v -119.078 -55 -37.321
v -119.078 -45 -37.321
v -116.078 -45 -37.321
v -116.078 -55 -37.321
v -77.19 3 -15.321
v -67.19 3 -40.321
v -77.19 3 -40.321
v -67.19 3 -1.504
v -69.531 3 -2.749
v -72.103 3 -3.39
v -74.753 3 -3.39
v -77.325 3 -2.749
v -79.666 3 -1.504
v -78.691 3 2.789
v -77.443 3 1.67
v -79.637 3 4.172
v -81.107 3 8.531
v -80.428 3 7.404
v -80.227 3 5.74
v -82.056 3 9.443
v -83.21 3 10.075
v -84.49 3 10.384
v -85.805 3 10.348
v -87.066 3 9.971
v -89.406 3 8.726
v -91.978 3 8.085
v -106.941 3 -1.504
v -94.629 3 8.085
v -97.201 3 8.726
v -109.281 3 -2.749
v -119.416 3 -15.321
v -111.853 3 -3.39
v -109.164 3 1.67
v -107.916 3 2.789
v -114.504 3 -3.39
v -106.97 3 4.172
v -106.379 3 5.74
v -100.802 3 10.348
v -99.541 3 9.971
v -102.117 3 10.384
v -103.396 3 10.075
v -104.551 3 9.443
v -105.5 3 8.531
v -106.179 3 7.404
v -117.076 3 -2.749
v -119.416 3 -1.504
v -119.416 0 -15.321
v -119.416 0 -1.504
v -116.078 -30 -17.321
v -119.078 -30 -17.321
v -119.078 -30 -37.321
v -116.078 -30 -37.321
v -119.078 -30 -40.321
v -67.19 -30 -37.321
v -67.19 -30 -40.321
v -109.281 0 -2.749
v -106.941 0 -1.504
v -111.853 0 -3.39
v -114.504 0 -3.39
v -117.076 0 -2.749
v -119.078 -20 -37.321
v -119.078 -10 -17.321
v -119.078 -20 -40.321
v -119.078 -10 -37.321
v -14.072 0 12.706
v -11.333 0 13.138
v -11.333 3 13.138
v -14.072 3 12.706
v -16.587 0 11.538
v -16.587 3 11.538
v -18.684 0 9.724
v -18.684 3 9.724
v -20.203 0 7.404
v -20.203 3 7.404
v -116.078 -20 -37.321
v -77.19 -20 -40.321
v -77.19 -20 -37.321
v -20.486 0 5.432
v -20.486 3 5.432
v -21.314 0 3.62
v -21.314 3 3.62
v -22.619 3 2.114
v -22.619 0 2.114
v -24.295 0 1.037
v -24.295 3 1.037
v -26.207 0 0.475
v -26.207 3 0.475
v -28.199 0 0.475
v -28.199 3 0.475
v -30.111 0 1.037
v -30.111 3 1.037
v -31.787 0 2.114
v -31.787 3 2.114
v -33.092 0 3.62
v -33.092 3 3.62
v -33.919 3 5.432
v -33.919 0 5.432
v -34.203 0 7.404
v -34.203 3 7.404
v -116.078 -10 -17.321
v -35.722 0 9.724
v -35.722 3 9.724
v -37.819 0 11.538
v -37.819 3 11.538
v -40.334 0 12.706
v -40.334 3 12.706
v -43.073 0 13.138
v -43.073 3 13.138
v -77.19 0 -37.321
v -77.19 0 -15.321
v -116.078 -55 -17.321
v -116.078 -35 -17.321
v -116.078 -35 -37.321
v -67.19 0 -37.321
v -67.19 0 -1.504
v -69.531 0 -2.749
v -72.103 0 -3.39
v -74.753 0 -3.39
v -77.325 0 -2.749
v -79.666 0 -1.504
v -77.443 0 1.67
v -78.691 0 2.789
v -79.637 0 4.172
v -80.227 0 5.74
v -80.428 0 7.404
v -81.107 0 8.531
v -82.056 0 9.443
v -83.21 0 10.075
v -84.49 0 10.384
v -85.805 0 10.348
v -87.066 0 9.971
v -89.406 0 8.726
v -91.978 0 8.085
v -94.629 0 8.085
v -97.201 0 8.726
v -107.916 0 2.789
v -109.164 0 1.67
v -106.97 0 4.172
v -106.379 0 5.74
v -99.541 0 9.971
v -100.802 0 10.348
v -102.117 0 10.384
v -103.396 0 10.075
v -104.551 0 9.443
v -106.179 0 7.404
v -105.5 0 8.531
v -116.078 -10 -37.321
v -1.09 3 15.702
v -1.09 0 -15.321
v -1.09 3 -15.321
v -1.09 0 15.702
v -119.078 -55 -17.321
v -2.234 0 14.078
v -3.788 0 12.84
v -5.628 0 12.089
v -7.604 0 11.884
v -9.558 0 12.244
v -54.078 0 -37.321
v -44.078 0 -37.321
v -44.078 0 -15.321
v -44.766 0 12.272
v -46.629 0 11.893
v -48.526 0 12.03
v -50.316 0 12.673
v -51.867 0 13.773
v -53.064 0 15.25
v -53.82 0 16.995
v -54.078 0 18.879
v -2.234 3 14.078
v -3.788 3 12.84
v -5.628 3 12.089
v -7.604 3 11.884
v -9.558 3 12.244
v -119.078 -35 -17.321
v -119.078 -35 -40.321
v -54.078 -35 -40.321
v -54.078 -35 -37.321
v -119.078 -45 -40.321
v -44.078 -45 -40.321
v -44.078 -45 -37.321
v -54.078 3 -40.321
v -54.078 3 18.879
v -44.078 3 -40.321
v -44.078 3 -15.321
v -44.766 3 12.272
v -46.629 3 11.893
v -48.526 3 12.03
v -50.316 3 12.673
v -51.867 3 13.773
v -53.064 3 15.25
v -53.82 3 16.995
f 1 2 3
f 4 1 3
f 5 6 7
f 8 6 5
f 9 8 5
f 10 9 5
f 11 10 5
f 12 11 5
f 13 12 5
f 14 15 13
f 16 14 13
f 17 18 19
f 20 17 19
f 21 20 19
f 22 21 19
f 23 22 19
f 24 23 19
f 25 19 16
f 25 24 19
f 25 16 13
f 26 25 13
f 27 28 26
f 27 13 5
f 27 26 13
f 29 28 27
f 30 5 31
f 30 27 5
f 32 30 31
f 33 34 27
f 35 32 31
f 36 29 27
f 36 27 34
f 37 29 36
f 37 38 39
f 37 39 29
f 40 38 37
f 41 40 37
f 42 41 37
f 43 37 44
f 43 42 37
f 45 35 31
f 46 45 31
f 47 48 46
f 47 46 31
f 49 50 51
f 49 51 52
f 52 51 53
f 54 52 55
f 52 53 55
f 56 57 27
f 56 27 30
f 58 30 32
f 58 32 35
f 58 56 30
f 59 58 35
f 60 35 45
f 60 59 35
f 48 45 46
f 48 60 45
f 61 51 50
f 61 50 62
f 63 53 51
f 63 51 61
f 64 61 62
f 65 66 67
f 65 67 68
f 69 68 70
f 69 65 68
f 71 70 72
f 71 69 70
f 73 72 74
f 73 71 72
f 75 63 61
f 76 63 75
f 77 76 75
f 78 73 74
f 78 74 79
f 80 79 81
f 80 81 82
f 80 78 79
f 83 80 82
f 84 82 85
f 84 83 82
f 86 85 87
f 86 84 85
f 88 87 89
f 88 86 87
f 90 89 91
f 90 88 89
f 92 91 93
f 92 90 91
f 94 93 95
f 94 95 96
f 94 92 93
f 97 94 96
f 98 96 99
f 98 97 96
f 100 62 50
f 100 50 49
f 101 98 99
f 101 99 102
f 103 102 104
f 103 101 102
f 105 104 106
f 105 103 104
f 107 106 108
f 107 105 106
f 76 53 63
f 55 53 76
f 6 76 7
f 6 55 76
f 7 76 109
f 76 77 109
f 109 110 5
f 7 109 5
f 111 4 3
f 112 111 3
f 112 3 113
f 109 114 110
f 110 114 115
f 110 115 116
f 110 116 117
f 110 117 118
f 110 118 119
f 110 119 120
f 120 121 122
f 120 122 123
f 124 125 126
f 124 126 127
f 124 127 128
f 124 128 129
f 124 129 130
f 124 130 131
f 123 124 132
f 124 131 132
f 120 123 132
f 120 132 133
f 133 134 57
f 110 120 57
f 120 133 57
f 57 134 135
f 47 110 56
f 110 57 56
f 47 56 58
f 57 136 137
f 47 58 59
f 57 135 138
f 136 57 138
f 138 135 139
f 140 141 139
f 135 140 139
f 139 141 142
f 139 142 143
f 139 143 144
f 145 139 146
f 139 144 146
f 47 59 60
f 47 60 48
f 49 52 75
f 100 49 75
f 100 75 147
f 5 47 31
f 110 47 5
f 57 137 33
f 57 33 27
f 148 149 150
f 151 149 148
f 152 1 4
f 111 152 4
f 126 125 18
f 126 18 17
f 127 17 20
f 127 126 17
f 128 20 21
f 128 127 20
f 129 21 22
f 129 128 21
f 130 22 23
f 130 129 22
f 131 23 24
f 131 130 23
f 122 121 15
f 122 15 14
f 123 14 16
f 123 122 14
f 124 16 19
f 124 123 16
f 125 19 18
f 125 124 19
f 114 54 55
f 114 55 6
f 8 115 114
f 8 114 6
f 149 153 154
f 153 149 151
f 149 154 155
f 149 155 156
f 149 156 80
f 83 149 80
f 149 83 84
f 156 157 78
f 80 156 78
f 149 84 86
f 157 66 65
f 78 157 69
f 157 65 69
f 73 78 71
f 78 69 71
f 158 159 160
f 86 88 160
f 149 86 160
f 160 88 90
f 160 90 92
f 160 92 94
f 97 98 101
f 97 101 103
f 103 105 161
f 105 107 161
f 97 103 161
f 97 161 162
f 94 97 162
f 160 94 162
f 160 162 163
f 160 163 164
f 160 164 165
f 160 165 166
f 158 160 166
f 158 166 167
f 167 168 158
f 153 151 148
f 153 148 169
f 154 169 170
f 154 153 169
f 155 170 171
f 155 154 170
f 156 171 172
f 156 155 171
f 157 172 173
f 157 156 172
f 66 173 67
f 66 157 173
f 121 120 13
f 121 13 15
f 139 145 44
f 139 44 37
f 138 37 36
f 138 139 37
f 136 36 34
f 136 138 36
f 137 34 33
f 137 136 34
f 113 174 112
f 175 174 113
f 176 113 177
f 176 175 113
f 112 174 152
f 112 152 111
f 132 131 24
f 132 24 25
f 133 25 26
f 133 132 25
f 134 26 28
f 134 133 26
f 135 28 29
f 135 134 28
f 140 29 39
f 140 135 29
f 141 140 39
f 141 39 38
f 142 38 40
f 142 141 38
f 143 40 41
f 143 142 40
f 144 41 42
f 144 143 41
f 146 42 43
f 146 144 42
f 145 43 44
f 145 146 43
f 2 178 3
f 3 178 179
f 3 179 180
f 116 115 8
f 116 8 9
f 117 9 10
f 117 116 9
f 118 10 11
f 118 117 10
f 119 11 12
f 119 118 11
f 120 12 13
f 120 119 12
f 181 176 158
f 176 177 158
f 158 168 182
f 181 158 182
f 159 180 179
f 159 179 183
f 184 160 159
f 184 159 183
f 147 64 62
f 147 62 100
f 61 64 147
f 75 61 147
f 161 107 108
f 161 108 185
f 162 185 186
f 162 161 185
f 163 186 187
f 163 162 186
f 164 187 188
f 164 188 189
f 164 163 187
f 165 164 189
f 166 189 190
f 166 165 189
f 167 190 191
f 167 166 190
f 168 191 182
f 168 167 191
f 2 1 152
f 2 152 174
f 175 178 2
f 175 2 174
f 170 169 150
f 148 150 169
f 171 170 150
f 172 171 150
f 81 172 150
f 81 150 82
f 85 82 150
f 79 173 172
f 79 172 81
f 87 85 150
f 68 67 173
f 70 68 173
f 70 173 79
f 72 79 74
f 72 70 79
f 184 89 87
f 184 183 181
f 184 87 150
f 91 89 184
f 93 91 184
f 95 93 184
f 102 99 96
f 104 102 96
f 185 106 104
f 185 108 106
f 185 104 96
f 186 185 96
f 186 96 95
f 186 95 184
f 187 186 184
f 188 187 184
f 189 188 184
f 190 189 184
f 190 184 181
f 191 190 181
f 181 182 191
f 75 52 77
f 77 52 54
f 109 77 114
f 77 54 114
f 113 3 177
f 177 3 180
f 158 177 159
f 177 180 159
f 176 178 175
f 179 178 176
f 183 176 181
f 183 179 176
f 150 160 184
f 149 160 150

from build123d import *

# Parameters (mm, degrees)
BOSS_EXTRUDE1_DEPTH   = 3
BOSS_EXTRUDE1_2_DEPTH = 3
SKETCH3_W             = 10
SKETCH3_H             = 3
BOSS_EXTRUDE2_DEPTH   = 25
SKETCH4_W             = 10
SKETCH4_H             = 3
BOSS_EXTRUDE3_DEPTH   = 33
SKETCH5_W             = 10
SKETCH5_H             = 3
BOSS_EXTRUDE4_DEPTH   = 48
SKETCH6_W             = 3
SKETCH6_H             = 10
BOSS_EXTRUDE5_DEPTH   = 65
SKETCH7_W             = 3
SKETCH7_H             = 10
BOSS_EXTRUDE6_DEPTH   = 41.887643745
SKETCH8_W             = 3
SKETCH8_H             = 20
BOSS_EXTRUDE7_DEPTH   = 20


with BuildPart() as part:
    # Sketch1 → Boss-Extrude1 (new body)
    with BuildSketch(Plane(origin=(0, 0, 0), x_dir=(1, 0, 0), z_dir=(0, 1, 0))):
        with BuildLine():
            Line((-109.16363165, -1.669940304), (-106.941022959, 1.504273867))
            ThreePointArc((-106.941022959, 1.504273867), (-113.178666704, 3.470995386), (-119.41631045, 1.504273867))
            Line((-119.41631045, 1.504273867), (-119.41631045, 15.320995386))
            Line((-119.41631045, 15.320995386), (-67.190456925, 15.320995386))
            Line((-67.190456925, 15.320995386), (-67.190456925, 1.504273867))
            ThreePointArc((-67.190456925, 1.504273867), (-73.428100671, 3.470995386), (-79.665744416, 1.504273867))
            Line((-79.665744416, 1.504273867), (-77.443135725, -1.669940304))
            ThreePointArc((-77.443135725, -1.669940304), (-79.637176503, -4.171764322), (-80.428100671, -7.404004614))
            ThreePointArc((-80.428100671, -7.404004614), (-83.210469377, -10.07464784), (-87.065739942, -9.970726133))
            ThreePointArc((-87.065739942, -9.970726133), (-93.303383688, -8.004004614), (-99.541027433, -9.970726133))
            ThreePointArc((-99.541027433, -9.970726133), (-103.396297998, -10.07464784), (-106.178666704, -7.404004614))
            ThreePointArc((-106.178666704, -7.404004614), (-106.969590872, -4.171764322), (-109.16363165, -1.669940304))
        make_face()
    extrude(amount=BOSS_EXTRUDE1_DEPTH)



with BuildPart() as body_2:
    # Sketch1 → Boss-Extrude1 2 (new body)
    with BuildSketch(Plane(origin=(0, 0, 0), x_dir=(1, 0, 0), z_dir=(0, 1, 0))):
        with BuildLine():
            Line((-54.078100671, -18.879004614), (-54.078100671, 15.320995386))
            Line((-54.078100671, 15.320995386), (-1.089890892, 15.320995386))
            Line((-1.089890892, 15.320995386), (-1.089890892, -15.70224518))
            ThreePointArc((-1.089890892, -15.70224518), (-5.627623756, -12.088547855), (-11.332738428, -13.138068924))
            ThreePointArc((-11.332738428, -13.138068924), (-16.58656989, -11.537633756), (-20.202817654, -7.404004614))
            ThreePointArc((-20.202817654, -7.404004614), (-27.202817654, -0.404004614), (-34.202817654, -7.404004614))
            ThreePointArc((-34.202817654, -7.404004614), (-37.819065418, -11.537633756), (-43.07289688, -13.138068924))
            ThreePointArc((-43.07289688, -13.138068924), (-50.315659432, -12.672700298), (-54.078100671, -18.879004614))
        make_face()
    extrude(amount=BOSS_EXTRUDE1_2_DEPTH)


with BuildPart() as part_1:
    add(part.part)

    add(body_2.part)  # Boss-Extrude2 merges body 2
    # Sketch3 → Boss-Extrude2 (add)
    with BuildSketch(Plane(origin=(0, 0, -15.320995386), x_dir=(-1, 0, 0), z_dir=(0, 0, -1))):
        with Locations((72.190456925, 1.5)):
            Rectangle(SKETCH3_W, SKETCH3_H)
        with Locations((49.078100671, 1.5)):
            Rectangle(SKETCH3_W, SKETCH3_H)
    extrude(amount=BOSS_EXTRUDE2_DEPTH)

    # Sketch4 → Boss-Extrude3 (add)
    with BuildSketch(Plane(origin=(0, 3, 0), x_dir=(1, 0, 0), z_dir=(0, 1, 0))):
        with Locations((-72.190456925, 38.820995386)):
            Rectangle(SKETCH4_W, SKETCH4_H)
    extrude(amount=-BOSS_EXTRUDE3_DEPTH)

    # Sketch5 → Boss-Extrude4 (add)
    with BuildSketch(Plane(origin=(0, 3, 0), x_dir=(1, 0, 0), z_dir=(0, 1, 0))):
        with Locations((-49.078100671, 38.820995386)):
            Rectangle(SKETCH5_W, SKETCH5_H)
    extrude(amount=-BOSS_EXTRUDE4_DEPTH)

    # Sketch6 → Boss-Extrude5 (add)
    with BuildSketch(Plane.ZY.offset(54.078100671)):
        with Locations((-38.820995386, -40)):
            Rectangle(SKETCH6_W, SKETCH6_H)
    extrude(amount=BOSS_EXTRUDE5_DEPTH)

    # Sketch7 → Boss-Extrude6 (add)
    with BuildSketch(Plane.ZY.offset(77.190456925)):
        with Locations((-38.820995386, -25)):
            Rectangle(SKETCH7_W, SKETCH7_H)
    extrude(amount=BOSS_EXTRUDE6_DEPTH)

    # Sketch8 → Boss-Extrude7 (add)
    with BuildSketch(Plane.XY.offset(-37.320995386)):
        with Locations((-117.578100671, -20)):
            Rectangle(SKETCH8_W, SKETCH8_H)
        with Locations((-117.578100671, -45)):
            Rectangle(SKETCH8_W, SKETCH8_H)
    extrude(amount=BOSS_EXTRUDE7_DEPTH)


solid = part_1.part
